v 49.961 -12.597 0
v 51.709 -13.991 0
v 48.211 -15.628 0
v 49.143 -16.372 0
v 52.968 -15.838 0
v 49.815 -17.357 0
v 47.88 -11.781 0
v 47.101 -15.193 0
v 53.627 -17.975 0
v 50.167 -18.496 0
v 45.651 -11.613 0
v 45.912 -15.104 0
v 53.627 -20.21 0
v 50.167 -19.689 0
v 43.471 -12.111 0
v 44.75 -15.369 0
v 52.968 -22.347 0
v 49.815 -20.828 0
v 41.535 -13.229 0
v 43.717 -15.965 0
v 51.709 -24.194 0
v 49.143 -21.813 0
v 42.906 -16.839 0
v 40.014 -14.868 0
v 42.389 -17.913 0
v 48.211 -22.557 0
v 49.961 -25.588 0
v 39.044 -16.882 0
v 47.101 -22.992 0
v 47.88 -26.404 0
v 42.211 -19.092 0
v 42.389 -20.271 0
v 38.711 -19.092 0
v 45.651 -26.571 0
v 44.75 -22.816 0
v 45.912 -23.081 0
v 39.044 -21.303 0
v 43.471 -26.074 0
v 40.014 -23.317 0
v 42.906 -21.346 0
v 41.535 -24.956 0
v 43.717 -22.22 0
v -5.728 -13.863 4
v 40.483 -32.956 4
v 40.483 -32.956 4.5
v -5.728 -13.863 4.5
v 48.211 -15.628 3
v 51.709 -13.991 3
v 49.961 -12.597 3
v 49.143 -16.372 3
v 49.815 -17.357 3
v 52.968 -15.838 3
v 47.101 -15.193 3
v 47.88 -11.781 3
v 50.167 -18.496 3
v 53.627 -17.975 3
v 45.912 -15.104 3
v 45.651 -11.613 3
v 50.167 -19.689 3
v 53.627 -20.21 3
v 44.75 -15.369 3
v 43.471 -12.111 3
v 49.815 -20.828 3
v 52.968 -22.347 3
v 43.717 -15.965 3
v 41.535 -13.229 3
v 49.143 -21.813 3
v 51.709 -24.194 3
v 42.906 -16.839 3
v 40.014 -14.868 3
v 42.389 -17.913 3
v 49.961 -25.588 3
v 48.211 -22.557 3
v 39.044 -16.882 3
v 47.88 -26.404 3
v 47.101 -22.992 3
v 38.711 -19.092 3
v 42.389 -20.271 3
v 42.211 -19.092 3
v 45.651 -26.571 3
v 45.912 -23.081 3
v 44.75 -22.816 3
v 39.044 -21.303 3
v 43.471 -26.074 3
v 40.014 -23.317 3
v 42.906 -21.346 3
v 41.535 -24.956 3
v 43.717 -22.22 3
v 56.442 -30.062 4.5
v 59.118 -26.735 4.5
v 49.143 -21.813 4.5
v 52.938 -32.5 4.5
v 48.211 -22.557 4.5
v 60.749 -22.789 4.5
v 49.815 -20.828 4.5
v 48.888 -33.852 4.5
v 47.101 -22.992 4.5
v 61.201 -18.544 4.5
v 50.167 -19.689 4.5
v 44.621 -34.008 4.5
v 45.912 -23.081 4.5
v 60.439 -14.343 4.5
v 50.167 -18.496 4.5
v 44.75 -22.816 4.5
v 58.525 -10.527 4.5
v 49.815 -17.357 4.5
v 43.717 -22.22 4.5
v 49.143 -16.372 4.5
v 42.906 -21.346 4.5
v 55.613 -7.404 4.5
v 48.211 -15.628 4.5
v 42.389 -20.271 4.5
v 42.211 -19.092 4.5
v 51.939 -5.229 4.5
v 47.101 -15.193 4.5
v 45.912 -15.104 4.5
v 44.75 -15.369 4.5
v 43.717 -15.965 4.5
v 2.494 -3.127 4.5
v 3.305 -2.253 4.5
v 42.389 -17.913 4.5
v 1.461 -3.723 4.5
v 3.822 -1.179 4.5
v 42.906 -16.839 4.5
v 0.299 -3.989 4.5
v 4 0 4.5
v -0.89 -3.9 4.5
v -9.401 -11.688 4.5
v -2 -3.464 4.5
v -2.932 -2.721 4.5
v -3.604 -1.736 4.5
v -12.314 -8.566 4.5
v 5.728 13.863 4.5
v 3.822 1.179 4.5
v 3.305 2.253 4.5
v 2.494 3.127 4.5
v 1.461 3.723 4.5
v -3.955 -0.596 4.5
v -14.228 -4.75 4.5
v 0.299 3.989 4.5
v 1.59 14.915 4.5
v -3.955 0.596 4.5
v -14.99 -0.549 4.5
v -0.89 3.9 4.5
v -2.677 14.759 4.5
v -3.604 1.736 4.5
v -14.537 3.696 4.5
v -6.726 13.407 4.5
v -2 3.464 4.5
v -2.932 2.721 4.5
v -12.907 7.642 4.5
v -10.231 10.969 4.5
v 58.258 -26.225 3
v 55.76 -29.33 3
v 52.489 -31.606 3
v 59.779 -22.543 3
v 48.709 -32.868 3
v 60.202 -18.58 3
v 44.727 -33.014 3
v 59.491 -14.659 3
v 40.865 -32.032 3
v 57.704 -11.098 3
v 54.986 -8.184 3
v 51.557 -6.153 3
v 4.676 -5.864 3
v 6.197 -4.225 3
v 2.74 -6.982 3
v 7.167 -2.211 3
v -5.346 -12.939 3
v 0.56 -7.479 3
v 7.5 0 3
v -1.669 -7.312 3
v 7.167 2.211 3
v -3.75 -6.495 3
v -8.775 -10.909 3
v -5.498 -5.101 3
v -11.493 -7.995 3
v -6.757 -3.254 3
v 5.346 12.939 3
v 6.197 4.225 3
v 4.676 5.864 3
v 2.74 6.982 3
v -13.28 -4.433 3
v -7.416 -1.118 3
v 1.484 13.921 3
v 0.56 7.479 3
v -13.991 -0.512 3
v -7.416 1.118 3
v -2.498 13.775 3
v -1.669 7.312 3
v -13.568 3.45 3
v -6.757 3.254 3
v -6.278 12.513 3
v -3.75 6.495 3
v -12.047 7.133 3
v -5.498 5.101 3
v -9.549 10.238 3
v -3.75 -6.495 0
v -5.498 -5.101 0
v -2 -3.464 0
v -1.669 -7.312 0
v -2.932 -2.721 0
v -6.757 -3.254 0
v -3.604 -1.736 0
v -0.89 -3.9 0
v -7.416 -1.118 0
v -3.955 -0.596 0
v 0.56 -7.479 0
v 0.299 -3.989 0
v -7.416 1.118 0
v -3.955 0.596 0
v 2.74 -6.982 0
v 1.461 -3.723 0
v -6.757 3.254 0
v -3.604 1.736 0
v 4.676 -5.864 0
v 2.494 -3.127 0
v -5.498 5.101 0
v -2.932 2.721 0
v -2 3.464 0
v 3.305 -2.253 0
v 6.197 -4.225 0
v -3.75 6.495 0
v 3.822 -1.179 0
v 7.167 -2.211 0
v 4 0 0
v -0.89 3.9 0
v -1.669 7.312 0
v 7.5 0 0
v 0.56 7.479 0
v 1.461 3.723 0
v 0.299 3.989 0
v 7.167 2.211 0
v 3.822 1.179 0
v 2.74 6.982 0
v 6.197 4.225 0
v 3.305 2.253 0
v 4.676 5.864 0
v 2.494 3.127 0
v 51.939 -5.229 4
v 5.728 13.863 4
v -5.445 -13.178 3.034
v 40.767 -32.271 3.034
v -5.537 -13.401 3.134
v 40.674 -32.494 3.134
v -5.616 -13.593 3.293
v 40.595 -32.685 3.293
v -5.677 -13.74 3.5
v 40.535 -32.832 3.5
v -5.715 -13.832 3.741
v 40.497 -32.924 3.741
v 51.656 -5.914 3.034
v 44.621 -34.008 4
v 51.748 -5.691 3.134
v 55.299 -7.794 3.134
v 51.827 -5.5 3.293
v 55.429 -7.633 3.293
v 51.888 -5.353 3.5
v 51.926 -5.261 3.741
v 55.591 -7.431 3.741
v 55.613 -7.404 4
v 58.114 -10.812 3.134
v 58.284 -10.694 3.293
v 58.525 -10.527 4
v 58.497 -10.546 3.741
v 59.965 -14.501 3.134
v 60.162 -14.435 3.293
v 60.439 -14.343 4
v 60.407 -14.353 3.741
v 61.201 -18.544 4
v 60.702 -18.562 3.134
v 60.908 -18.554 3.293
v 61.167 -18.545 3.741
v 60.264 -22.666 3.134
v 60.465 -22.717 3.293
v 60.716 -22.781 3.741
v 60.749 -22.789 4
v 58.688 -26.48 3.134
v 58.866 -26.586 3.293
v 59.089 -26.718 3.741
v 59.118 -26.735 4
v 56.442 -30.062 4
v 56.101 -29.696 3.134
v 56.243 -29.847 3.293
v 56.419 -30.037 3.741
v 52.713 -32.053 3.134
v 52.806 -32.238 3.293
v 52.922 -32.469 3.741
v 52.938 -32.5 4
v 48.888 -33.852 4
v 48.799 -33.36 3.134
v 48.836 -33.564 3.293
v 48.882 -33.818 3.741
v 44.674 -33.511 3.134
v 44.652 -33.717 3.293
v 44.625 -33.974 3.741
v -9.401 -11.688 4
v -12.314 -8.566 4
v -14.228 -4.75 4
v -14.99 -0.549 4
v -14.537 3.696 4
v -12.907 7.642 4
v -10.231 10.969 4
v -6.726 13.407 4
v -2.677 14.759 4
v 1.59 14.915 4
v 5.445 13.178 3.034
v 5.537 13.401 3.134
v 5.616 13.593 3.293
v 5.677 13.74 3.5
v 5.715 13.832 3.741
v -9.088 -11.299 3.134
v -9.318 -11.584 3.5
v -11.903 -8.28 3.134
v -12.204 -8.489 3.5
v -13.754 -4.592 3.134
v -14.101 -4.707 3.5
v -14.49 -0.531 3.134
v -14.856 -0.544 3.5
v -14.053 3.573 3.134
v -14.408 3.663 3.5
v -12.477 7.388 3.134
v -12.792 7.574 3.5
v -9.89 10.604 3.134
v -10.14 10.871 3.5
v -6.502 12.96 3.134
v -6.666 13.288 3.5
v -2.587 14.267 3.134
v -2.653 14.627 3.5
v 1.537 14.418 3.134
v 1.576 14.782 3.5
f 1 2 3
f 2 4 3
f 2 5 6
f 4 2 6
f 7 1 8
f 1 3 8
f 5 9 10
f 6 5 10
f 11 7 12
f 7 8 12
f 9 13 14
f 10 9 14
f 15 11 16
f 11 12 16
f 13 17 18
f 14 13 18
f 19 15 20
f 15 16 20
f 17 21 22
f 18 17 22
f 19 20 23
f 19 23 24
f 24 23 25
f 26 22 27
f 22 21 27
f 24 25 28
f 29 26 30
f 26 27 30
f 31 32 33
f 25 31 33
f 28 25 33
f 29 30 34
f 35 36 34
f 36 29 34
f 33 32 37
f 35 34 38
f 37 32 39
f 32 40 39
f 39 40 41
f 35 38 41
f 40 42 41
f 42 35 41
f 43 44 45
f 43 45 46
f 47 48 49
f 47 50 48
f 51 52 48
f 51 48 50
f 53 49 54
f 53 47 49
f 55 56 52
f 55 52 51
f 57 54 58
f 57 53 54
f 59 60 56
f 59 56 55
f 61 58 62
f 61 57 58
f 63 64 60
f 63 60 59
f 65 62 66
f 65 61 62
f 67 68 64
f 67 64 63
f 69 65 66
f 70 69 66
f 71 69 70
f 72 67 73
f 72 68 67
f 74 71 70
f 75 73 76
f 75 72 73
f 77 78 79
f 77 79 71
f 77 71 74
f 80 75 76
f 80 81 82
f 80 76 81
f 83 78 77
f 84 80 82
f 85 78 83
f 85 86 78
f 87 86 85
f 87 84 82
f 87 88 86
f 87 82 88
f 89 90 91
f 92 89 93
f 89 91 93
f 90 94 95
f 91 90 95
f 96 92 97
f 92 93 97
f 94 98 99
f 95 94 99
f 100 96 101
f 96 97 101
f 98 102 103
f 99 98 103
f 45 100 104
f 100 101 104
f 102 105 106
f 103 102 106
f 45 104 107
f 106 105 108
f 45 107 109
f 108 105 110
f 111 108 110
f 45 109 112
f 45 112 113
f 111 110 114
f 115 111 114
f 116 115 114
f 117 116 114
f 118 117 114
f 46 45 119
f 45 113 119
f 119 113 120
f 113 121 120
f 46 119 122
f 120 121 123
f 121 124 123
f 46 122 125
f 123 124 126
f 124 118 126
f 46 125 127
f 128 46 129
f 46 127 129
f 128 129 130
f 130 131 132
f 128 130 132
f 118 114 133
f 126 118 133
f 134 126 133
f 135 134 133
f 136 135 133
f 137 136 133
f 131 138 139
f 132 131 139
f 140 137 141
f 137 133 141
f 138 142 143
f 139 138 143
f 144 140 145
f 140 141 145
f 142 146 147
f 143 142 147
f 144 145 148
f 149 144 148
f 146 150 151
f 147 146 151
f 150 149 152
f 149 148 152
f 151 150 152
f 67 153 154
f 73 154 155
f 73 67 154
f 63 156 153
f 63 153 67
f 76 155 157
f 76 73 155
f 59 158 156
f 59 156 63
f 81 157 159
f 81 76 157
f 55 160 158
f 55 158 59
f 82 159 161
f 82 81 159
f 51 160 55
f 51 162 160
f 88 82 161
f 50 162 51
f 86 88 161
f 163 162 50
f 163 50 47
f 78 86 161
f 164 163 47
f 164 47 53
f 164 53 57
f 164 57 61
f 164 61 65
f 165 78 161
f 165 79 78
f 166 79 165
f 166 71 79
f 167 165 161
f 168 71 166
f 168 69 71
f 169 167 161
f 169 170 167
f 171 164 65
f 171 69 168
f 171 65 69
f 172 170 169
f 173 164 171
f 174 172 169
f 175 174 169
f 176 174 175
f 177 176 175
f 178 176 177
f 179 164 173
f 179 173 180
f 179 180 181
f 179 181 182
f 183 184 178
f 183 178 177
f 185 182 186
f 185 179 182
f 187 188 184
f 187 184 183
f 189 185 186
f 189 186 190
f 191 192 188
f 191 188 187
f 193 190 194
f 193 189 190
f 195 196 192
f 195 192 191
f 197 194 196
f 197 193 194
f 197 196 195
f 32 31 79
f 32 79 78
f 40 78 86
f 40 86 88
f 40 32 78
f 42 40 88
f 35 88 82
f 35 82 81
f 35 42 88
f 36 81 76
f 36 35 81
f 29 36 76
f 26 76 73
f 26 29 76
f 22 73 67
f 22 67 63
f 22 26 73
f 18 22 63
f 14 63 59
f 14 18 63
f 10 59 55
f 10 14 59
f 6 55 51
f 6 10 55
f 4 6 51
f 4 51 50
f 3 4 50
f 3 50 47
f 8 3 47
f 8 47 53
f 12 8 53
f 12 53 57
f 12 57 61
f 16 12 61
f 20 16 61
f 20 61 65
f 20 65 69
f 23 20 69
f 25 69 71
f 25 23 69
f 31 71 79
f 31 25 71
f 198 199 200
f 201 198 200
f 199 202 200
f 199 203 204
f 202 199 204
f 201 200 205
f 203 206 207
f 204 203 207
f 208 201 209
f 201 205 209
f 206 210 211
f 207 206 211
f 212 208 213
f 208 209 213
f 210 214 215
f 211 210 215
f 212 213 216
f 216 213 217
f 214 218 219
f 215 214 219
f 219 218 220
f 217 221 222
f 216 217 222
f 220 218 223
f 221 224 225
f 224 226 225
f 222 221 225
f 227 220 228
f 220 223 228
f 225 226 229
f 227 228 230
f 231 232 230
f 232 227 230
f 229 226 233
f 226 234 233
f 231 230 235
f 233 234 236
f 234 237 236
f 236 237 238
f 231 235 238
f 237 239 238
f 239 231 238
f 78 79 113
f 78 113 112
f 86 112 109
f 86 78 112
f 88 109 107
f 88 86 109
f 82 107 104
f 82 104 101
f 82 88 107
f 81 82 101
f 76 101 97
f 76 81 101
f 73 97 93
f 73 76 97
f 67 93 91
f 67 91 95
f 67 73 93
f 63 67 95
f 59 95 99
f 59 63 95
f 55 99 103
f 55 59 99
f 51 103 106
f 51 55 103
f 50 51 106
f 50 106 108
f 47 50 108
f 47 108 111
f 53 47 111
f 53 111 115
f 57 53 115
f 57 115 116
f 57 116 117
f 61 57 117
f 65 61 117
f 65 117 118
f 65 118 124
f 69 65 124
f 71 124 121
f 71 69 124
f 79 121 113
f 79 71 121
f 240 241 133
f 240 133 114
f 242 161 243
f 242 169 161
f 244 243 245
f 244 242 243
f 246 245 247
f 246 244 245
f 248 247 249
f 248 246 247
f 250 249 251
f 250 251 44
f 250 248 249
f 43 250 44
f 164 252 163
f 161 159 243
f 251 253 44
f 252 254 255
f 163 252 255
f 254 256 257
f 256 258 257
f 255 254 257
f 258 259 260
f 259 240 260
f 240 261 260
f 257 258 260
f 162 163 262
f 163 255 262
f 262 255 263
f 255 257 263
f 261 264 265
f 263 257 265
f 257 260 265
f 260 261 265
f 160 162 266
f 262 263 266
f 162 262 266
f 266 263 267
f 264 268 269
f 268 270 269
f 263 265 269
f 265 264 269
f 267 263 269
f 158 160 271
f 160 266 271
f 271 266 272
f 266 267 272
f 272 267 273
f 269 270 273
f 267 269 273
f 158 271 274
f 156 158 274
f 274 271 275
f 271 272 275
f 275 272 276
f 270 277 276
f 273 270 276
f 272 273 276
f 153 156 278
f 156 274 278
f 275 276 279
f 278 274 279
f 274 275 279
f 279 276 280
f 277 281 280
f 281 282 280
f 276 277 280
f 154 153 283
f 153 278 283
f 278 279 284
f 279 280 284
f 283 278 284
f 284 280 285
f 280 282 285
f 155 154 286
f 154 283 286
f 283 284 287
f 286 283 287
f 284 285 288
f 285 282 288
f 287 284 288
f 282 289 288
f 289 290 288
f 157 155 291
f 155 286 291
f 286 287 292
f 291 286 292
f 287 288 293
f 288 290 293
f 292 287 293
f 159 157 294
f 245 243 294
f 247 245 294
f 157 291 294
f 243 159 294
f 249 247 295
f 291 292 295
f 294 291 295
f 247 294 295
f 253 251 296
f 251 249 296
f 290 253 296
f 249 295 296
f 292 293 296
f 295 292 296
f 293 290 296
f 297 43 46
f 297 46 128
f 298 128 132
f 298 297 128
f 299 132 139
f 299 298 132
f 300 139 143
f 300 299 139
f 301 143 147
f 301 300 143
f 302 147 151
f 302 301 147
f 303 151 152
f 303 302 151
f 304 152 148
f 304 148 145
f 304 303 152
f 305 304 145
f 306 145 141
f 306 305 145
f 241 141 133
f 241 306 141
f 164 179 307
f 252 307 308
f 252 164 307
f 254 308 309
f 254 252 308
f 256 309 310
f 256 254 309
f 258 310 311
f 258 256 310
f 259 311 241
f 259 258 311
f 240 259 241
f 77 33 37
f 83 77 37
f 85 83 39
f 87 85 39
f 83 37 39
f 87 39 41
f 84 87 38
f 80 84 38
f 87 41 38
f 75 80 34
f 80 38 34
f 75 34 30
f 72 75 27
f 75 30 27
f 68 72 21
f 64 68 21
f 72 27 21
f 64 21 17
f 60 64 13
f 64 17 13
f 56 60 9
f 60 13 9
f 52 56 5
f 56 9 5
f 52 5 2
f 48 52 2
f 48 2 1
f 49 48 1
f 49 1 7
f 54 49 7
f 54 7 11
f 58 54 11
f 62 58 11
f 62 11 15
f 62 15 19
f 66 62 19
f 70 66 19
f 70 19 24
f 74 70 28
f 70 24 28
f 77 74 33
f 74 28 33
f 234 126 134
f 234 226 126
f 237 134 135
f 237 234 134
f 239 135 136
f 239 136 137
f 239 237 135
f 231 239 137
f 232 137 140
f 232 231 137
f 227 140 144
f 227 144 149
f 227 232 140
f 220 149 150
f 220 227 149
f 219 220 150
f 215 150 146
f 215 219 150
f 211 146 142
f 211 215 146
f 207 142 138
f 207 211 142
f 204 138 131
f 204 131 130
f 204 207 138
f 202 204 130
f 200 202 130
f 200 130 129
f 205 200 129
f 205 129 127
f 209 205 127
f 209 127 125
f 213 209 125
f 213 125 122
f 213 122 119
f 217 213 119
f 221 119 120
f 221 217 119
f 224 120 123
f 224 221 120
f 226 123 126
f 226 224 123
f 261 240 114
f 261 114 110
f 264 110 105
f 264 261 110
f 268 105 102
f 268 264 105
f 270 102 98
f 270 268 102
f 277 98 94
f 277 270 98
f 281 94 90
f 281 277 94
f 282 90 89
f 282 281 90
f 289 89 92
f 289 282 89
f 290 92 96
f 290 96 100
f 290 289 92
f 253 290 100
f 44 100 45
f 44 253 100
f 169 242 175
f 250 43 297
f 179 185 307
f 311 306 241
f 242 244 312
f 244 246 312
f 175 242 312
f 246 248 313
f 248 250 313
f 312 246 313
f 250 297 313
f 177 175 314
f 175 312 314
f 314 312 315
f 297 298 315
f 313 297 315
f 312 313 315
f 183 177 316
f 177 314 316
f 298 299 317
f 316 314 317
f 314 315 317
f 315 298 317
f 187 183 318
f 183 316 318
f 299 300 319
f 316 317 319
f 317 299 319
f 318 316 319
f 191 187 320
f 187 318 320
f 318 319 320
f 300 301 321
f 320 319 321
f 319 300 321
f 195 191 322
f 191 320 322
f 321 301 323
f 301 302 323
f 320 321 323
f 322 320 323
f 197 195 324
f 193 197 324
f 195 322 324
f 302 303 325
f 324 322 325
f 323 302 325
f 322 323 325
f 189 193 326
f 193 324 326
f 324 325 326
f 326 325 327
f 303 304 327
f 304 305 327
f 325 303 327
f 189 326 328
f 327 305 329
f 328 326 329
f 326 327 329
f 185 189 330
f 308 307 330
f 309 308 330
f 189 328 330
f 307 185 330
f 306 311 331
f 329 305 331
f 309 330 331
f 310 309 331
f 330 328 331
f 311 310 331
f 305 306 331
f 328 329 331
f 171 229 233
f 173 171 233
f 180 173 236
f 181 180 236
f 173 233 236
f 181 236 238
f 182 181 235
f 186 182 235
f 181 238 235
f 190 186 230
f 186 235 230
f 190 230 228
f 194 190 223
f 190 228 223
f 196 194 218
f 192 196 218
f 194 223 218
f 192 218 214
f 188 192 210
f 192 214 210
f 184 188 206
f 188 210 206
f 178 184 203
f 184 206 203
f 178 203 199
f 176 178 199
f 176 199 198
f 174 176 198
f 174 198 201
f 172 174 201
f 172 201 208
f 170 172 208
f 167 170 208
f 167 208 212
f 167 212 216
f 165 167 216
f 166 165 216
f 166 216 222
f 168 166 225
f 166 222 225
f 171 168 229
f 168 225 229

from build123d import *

# Parameters (mm, degrees)
SKETCH1_R             = 7.5
SKETCH1_R_2           = 4
BOSS_EXTRUDE1_DEPTH   = 3
BOSS_EXTRUDE1_2_DEPTH = 3
SKETCH2_R             = 4
BOSS_EXTRUDE2_DEPTH   = 1.5
FILLET1_R             = 1


with BuildPart() as part:
    # Sketch1 → Boss-Extrude1 (new body)
    with BuildSketch(Plane.XY):
        Circle(SKETCH1_R)
        Circle(SKETCH1_R_2, mode=Mode.SUBTRACT)
    extrude(amount=BOSS_EXTRUDE1_DEPTH)

    # Sketch2 → Boss-Extrude2 (add)
    with BuildSketch(Plane.XY.offset(3)):
        with BuildLine():
            Line((5.72773978, 13.863368891), (51.938969417, -5.229097043))
            ThreePointArc((51.938969417, -5.229097043), (60.074598528, -24.820205715), (40.483489857, -32.955834825))
            Line((40.483489857, -32.955834825), (-5.72773978, -13.863368891))
            ThreePointArc((-5.72773978, -13.863368891), (-13.863368891, 5.72773978), (5.72773978, 13.863368891))
        make_face()
        Circle(SKETCH2_R, mode=Mode.SUBTRACT)
        with Locations(Location((46.211229637, -19.092465934, 0), (0, 0, 180))):
            Circle(SKETCH2_R, mode=Mode.SUBTRACT)
    extrude(amount=BOSS_EXTRUDE2_DEPTH)

    # Fillet1
    fillet1_edges = [part.edges().sort_by_distance(p)[0] for p in [
        (-13.863368891, 5.72773978, 3),
        (17.377875038, -23.409601858, 3),
        (60.074598528, -24.820205715, 3),
        (28.833354599, 4.317135924, 3),
    ]]
    fillet(fillet1_edges, radius=FILLET1_R)


with BuildPart() as body_2:
    # Sketch1 → Boss-Extrude1 2 (new body)
    with BuildSketch(Plane.XY):
        with Locations(Location((46.211229637, -19.092465934, 0), (0, 0, 180))):
            Circle(SKETCH1_R)
        with Locations(Location((46.211229637, -19.092465934, 0), (0, 0, 180))):
            Circle(SKETCH1_R_2, mode=Mode.SUBTRACT)
    extrude(amount=BOSS_EXTRUDE1_2_DEPTH)


solid = Compound([part.part, body_2.part])
